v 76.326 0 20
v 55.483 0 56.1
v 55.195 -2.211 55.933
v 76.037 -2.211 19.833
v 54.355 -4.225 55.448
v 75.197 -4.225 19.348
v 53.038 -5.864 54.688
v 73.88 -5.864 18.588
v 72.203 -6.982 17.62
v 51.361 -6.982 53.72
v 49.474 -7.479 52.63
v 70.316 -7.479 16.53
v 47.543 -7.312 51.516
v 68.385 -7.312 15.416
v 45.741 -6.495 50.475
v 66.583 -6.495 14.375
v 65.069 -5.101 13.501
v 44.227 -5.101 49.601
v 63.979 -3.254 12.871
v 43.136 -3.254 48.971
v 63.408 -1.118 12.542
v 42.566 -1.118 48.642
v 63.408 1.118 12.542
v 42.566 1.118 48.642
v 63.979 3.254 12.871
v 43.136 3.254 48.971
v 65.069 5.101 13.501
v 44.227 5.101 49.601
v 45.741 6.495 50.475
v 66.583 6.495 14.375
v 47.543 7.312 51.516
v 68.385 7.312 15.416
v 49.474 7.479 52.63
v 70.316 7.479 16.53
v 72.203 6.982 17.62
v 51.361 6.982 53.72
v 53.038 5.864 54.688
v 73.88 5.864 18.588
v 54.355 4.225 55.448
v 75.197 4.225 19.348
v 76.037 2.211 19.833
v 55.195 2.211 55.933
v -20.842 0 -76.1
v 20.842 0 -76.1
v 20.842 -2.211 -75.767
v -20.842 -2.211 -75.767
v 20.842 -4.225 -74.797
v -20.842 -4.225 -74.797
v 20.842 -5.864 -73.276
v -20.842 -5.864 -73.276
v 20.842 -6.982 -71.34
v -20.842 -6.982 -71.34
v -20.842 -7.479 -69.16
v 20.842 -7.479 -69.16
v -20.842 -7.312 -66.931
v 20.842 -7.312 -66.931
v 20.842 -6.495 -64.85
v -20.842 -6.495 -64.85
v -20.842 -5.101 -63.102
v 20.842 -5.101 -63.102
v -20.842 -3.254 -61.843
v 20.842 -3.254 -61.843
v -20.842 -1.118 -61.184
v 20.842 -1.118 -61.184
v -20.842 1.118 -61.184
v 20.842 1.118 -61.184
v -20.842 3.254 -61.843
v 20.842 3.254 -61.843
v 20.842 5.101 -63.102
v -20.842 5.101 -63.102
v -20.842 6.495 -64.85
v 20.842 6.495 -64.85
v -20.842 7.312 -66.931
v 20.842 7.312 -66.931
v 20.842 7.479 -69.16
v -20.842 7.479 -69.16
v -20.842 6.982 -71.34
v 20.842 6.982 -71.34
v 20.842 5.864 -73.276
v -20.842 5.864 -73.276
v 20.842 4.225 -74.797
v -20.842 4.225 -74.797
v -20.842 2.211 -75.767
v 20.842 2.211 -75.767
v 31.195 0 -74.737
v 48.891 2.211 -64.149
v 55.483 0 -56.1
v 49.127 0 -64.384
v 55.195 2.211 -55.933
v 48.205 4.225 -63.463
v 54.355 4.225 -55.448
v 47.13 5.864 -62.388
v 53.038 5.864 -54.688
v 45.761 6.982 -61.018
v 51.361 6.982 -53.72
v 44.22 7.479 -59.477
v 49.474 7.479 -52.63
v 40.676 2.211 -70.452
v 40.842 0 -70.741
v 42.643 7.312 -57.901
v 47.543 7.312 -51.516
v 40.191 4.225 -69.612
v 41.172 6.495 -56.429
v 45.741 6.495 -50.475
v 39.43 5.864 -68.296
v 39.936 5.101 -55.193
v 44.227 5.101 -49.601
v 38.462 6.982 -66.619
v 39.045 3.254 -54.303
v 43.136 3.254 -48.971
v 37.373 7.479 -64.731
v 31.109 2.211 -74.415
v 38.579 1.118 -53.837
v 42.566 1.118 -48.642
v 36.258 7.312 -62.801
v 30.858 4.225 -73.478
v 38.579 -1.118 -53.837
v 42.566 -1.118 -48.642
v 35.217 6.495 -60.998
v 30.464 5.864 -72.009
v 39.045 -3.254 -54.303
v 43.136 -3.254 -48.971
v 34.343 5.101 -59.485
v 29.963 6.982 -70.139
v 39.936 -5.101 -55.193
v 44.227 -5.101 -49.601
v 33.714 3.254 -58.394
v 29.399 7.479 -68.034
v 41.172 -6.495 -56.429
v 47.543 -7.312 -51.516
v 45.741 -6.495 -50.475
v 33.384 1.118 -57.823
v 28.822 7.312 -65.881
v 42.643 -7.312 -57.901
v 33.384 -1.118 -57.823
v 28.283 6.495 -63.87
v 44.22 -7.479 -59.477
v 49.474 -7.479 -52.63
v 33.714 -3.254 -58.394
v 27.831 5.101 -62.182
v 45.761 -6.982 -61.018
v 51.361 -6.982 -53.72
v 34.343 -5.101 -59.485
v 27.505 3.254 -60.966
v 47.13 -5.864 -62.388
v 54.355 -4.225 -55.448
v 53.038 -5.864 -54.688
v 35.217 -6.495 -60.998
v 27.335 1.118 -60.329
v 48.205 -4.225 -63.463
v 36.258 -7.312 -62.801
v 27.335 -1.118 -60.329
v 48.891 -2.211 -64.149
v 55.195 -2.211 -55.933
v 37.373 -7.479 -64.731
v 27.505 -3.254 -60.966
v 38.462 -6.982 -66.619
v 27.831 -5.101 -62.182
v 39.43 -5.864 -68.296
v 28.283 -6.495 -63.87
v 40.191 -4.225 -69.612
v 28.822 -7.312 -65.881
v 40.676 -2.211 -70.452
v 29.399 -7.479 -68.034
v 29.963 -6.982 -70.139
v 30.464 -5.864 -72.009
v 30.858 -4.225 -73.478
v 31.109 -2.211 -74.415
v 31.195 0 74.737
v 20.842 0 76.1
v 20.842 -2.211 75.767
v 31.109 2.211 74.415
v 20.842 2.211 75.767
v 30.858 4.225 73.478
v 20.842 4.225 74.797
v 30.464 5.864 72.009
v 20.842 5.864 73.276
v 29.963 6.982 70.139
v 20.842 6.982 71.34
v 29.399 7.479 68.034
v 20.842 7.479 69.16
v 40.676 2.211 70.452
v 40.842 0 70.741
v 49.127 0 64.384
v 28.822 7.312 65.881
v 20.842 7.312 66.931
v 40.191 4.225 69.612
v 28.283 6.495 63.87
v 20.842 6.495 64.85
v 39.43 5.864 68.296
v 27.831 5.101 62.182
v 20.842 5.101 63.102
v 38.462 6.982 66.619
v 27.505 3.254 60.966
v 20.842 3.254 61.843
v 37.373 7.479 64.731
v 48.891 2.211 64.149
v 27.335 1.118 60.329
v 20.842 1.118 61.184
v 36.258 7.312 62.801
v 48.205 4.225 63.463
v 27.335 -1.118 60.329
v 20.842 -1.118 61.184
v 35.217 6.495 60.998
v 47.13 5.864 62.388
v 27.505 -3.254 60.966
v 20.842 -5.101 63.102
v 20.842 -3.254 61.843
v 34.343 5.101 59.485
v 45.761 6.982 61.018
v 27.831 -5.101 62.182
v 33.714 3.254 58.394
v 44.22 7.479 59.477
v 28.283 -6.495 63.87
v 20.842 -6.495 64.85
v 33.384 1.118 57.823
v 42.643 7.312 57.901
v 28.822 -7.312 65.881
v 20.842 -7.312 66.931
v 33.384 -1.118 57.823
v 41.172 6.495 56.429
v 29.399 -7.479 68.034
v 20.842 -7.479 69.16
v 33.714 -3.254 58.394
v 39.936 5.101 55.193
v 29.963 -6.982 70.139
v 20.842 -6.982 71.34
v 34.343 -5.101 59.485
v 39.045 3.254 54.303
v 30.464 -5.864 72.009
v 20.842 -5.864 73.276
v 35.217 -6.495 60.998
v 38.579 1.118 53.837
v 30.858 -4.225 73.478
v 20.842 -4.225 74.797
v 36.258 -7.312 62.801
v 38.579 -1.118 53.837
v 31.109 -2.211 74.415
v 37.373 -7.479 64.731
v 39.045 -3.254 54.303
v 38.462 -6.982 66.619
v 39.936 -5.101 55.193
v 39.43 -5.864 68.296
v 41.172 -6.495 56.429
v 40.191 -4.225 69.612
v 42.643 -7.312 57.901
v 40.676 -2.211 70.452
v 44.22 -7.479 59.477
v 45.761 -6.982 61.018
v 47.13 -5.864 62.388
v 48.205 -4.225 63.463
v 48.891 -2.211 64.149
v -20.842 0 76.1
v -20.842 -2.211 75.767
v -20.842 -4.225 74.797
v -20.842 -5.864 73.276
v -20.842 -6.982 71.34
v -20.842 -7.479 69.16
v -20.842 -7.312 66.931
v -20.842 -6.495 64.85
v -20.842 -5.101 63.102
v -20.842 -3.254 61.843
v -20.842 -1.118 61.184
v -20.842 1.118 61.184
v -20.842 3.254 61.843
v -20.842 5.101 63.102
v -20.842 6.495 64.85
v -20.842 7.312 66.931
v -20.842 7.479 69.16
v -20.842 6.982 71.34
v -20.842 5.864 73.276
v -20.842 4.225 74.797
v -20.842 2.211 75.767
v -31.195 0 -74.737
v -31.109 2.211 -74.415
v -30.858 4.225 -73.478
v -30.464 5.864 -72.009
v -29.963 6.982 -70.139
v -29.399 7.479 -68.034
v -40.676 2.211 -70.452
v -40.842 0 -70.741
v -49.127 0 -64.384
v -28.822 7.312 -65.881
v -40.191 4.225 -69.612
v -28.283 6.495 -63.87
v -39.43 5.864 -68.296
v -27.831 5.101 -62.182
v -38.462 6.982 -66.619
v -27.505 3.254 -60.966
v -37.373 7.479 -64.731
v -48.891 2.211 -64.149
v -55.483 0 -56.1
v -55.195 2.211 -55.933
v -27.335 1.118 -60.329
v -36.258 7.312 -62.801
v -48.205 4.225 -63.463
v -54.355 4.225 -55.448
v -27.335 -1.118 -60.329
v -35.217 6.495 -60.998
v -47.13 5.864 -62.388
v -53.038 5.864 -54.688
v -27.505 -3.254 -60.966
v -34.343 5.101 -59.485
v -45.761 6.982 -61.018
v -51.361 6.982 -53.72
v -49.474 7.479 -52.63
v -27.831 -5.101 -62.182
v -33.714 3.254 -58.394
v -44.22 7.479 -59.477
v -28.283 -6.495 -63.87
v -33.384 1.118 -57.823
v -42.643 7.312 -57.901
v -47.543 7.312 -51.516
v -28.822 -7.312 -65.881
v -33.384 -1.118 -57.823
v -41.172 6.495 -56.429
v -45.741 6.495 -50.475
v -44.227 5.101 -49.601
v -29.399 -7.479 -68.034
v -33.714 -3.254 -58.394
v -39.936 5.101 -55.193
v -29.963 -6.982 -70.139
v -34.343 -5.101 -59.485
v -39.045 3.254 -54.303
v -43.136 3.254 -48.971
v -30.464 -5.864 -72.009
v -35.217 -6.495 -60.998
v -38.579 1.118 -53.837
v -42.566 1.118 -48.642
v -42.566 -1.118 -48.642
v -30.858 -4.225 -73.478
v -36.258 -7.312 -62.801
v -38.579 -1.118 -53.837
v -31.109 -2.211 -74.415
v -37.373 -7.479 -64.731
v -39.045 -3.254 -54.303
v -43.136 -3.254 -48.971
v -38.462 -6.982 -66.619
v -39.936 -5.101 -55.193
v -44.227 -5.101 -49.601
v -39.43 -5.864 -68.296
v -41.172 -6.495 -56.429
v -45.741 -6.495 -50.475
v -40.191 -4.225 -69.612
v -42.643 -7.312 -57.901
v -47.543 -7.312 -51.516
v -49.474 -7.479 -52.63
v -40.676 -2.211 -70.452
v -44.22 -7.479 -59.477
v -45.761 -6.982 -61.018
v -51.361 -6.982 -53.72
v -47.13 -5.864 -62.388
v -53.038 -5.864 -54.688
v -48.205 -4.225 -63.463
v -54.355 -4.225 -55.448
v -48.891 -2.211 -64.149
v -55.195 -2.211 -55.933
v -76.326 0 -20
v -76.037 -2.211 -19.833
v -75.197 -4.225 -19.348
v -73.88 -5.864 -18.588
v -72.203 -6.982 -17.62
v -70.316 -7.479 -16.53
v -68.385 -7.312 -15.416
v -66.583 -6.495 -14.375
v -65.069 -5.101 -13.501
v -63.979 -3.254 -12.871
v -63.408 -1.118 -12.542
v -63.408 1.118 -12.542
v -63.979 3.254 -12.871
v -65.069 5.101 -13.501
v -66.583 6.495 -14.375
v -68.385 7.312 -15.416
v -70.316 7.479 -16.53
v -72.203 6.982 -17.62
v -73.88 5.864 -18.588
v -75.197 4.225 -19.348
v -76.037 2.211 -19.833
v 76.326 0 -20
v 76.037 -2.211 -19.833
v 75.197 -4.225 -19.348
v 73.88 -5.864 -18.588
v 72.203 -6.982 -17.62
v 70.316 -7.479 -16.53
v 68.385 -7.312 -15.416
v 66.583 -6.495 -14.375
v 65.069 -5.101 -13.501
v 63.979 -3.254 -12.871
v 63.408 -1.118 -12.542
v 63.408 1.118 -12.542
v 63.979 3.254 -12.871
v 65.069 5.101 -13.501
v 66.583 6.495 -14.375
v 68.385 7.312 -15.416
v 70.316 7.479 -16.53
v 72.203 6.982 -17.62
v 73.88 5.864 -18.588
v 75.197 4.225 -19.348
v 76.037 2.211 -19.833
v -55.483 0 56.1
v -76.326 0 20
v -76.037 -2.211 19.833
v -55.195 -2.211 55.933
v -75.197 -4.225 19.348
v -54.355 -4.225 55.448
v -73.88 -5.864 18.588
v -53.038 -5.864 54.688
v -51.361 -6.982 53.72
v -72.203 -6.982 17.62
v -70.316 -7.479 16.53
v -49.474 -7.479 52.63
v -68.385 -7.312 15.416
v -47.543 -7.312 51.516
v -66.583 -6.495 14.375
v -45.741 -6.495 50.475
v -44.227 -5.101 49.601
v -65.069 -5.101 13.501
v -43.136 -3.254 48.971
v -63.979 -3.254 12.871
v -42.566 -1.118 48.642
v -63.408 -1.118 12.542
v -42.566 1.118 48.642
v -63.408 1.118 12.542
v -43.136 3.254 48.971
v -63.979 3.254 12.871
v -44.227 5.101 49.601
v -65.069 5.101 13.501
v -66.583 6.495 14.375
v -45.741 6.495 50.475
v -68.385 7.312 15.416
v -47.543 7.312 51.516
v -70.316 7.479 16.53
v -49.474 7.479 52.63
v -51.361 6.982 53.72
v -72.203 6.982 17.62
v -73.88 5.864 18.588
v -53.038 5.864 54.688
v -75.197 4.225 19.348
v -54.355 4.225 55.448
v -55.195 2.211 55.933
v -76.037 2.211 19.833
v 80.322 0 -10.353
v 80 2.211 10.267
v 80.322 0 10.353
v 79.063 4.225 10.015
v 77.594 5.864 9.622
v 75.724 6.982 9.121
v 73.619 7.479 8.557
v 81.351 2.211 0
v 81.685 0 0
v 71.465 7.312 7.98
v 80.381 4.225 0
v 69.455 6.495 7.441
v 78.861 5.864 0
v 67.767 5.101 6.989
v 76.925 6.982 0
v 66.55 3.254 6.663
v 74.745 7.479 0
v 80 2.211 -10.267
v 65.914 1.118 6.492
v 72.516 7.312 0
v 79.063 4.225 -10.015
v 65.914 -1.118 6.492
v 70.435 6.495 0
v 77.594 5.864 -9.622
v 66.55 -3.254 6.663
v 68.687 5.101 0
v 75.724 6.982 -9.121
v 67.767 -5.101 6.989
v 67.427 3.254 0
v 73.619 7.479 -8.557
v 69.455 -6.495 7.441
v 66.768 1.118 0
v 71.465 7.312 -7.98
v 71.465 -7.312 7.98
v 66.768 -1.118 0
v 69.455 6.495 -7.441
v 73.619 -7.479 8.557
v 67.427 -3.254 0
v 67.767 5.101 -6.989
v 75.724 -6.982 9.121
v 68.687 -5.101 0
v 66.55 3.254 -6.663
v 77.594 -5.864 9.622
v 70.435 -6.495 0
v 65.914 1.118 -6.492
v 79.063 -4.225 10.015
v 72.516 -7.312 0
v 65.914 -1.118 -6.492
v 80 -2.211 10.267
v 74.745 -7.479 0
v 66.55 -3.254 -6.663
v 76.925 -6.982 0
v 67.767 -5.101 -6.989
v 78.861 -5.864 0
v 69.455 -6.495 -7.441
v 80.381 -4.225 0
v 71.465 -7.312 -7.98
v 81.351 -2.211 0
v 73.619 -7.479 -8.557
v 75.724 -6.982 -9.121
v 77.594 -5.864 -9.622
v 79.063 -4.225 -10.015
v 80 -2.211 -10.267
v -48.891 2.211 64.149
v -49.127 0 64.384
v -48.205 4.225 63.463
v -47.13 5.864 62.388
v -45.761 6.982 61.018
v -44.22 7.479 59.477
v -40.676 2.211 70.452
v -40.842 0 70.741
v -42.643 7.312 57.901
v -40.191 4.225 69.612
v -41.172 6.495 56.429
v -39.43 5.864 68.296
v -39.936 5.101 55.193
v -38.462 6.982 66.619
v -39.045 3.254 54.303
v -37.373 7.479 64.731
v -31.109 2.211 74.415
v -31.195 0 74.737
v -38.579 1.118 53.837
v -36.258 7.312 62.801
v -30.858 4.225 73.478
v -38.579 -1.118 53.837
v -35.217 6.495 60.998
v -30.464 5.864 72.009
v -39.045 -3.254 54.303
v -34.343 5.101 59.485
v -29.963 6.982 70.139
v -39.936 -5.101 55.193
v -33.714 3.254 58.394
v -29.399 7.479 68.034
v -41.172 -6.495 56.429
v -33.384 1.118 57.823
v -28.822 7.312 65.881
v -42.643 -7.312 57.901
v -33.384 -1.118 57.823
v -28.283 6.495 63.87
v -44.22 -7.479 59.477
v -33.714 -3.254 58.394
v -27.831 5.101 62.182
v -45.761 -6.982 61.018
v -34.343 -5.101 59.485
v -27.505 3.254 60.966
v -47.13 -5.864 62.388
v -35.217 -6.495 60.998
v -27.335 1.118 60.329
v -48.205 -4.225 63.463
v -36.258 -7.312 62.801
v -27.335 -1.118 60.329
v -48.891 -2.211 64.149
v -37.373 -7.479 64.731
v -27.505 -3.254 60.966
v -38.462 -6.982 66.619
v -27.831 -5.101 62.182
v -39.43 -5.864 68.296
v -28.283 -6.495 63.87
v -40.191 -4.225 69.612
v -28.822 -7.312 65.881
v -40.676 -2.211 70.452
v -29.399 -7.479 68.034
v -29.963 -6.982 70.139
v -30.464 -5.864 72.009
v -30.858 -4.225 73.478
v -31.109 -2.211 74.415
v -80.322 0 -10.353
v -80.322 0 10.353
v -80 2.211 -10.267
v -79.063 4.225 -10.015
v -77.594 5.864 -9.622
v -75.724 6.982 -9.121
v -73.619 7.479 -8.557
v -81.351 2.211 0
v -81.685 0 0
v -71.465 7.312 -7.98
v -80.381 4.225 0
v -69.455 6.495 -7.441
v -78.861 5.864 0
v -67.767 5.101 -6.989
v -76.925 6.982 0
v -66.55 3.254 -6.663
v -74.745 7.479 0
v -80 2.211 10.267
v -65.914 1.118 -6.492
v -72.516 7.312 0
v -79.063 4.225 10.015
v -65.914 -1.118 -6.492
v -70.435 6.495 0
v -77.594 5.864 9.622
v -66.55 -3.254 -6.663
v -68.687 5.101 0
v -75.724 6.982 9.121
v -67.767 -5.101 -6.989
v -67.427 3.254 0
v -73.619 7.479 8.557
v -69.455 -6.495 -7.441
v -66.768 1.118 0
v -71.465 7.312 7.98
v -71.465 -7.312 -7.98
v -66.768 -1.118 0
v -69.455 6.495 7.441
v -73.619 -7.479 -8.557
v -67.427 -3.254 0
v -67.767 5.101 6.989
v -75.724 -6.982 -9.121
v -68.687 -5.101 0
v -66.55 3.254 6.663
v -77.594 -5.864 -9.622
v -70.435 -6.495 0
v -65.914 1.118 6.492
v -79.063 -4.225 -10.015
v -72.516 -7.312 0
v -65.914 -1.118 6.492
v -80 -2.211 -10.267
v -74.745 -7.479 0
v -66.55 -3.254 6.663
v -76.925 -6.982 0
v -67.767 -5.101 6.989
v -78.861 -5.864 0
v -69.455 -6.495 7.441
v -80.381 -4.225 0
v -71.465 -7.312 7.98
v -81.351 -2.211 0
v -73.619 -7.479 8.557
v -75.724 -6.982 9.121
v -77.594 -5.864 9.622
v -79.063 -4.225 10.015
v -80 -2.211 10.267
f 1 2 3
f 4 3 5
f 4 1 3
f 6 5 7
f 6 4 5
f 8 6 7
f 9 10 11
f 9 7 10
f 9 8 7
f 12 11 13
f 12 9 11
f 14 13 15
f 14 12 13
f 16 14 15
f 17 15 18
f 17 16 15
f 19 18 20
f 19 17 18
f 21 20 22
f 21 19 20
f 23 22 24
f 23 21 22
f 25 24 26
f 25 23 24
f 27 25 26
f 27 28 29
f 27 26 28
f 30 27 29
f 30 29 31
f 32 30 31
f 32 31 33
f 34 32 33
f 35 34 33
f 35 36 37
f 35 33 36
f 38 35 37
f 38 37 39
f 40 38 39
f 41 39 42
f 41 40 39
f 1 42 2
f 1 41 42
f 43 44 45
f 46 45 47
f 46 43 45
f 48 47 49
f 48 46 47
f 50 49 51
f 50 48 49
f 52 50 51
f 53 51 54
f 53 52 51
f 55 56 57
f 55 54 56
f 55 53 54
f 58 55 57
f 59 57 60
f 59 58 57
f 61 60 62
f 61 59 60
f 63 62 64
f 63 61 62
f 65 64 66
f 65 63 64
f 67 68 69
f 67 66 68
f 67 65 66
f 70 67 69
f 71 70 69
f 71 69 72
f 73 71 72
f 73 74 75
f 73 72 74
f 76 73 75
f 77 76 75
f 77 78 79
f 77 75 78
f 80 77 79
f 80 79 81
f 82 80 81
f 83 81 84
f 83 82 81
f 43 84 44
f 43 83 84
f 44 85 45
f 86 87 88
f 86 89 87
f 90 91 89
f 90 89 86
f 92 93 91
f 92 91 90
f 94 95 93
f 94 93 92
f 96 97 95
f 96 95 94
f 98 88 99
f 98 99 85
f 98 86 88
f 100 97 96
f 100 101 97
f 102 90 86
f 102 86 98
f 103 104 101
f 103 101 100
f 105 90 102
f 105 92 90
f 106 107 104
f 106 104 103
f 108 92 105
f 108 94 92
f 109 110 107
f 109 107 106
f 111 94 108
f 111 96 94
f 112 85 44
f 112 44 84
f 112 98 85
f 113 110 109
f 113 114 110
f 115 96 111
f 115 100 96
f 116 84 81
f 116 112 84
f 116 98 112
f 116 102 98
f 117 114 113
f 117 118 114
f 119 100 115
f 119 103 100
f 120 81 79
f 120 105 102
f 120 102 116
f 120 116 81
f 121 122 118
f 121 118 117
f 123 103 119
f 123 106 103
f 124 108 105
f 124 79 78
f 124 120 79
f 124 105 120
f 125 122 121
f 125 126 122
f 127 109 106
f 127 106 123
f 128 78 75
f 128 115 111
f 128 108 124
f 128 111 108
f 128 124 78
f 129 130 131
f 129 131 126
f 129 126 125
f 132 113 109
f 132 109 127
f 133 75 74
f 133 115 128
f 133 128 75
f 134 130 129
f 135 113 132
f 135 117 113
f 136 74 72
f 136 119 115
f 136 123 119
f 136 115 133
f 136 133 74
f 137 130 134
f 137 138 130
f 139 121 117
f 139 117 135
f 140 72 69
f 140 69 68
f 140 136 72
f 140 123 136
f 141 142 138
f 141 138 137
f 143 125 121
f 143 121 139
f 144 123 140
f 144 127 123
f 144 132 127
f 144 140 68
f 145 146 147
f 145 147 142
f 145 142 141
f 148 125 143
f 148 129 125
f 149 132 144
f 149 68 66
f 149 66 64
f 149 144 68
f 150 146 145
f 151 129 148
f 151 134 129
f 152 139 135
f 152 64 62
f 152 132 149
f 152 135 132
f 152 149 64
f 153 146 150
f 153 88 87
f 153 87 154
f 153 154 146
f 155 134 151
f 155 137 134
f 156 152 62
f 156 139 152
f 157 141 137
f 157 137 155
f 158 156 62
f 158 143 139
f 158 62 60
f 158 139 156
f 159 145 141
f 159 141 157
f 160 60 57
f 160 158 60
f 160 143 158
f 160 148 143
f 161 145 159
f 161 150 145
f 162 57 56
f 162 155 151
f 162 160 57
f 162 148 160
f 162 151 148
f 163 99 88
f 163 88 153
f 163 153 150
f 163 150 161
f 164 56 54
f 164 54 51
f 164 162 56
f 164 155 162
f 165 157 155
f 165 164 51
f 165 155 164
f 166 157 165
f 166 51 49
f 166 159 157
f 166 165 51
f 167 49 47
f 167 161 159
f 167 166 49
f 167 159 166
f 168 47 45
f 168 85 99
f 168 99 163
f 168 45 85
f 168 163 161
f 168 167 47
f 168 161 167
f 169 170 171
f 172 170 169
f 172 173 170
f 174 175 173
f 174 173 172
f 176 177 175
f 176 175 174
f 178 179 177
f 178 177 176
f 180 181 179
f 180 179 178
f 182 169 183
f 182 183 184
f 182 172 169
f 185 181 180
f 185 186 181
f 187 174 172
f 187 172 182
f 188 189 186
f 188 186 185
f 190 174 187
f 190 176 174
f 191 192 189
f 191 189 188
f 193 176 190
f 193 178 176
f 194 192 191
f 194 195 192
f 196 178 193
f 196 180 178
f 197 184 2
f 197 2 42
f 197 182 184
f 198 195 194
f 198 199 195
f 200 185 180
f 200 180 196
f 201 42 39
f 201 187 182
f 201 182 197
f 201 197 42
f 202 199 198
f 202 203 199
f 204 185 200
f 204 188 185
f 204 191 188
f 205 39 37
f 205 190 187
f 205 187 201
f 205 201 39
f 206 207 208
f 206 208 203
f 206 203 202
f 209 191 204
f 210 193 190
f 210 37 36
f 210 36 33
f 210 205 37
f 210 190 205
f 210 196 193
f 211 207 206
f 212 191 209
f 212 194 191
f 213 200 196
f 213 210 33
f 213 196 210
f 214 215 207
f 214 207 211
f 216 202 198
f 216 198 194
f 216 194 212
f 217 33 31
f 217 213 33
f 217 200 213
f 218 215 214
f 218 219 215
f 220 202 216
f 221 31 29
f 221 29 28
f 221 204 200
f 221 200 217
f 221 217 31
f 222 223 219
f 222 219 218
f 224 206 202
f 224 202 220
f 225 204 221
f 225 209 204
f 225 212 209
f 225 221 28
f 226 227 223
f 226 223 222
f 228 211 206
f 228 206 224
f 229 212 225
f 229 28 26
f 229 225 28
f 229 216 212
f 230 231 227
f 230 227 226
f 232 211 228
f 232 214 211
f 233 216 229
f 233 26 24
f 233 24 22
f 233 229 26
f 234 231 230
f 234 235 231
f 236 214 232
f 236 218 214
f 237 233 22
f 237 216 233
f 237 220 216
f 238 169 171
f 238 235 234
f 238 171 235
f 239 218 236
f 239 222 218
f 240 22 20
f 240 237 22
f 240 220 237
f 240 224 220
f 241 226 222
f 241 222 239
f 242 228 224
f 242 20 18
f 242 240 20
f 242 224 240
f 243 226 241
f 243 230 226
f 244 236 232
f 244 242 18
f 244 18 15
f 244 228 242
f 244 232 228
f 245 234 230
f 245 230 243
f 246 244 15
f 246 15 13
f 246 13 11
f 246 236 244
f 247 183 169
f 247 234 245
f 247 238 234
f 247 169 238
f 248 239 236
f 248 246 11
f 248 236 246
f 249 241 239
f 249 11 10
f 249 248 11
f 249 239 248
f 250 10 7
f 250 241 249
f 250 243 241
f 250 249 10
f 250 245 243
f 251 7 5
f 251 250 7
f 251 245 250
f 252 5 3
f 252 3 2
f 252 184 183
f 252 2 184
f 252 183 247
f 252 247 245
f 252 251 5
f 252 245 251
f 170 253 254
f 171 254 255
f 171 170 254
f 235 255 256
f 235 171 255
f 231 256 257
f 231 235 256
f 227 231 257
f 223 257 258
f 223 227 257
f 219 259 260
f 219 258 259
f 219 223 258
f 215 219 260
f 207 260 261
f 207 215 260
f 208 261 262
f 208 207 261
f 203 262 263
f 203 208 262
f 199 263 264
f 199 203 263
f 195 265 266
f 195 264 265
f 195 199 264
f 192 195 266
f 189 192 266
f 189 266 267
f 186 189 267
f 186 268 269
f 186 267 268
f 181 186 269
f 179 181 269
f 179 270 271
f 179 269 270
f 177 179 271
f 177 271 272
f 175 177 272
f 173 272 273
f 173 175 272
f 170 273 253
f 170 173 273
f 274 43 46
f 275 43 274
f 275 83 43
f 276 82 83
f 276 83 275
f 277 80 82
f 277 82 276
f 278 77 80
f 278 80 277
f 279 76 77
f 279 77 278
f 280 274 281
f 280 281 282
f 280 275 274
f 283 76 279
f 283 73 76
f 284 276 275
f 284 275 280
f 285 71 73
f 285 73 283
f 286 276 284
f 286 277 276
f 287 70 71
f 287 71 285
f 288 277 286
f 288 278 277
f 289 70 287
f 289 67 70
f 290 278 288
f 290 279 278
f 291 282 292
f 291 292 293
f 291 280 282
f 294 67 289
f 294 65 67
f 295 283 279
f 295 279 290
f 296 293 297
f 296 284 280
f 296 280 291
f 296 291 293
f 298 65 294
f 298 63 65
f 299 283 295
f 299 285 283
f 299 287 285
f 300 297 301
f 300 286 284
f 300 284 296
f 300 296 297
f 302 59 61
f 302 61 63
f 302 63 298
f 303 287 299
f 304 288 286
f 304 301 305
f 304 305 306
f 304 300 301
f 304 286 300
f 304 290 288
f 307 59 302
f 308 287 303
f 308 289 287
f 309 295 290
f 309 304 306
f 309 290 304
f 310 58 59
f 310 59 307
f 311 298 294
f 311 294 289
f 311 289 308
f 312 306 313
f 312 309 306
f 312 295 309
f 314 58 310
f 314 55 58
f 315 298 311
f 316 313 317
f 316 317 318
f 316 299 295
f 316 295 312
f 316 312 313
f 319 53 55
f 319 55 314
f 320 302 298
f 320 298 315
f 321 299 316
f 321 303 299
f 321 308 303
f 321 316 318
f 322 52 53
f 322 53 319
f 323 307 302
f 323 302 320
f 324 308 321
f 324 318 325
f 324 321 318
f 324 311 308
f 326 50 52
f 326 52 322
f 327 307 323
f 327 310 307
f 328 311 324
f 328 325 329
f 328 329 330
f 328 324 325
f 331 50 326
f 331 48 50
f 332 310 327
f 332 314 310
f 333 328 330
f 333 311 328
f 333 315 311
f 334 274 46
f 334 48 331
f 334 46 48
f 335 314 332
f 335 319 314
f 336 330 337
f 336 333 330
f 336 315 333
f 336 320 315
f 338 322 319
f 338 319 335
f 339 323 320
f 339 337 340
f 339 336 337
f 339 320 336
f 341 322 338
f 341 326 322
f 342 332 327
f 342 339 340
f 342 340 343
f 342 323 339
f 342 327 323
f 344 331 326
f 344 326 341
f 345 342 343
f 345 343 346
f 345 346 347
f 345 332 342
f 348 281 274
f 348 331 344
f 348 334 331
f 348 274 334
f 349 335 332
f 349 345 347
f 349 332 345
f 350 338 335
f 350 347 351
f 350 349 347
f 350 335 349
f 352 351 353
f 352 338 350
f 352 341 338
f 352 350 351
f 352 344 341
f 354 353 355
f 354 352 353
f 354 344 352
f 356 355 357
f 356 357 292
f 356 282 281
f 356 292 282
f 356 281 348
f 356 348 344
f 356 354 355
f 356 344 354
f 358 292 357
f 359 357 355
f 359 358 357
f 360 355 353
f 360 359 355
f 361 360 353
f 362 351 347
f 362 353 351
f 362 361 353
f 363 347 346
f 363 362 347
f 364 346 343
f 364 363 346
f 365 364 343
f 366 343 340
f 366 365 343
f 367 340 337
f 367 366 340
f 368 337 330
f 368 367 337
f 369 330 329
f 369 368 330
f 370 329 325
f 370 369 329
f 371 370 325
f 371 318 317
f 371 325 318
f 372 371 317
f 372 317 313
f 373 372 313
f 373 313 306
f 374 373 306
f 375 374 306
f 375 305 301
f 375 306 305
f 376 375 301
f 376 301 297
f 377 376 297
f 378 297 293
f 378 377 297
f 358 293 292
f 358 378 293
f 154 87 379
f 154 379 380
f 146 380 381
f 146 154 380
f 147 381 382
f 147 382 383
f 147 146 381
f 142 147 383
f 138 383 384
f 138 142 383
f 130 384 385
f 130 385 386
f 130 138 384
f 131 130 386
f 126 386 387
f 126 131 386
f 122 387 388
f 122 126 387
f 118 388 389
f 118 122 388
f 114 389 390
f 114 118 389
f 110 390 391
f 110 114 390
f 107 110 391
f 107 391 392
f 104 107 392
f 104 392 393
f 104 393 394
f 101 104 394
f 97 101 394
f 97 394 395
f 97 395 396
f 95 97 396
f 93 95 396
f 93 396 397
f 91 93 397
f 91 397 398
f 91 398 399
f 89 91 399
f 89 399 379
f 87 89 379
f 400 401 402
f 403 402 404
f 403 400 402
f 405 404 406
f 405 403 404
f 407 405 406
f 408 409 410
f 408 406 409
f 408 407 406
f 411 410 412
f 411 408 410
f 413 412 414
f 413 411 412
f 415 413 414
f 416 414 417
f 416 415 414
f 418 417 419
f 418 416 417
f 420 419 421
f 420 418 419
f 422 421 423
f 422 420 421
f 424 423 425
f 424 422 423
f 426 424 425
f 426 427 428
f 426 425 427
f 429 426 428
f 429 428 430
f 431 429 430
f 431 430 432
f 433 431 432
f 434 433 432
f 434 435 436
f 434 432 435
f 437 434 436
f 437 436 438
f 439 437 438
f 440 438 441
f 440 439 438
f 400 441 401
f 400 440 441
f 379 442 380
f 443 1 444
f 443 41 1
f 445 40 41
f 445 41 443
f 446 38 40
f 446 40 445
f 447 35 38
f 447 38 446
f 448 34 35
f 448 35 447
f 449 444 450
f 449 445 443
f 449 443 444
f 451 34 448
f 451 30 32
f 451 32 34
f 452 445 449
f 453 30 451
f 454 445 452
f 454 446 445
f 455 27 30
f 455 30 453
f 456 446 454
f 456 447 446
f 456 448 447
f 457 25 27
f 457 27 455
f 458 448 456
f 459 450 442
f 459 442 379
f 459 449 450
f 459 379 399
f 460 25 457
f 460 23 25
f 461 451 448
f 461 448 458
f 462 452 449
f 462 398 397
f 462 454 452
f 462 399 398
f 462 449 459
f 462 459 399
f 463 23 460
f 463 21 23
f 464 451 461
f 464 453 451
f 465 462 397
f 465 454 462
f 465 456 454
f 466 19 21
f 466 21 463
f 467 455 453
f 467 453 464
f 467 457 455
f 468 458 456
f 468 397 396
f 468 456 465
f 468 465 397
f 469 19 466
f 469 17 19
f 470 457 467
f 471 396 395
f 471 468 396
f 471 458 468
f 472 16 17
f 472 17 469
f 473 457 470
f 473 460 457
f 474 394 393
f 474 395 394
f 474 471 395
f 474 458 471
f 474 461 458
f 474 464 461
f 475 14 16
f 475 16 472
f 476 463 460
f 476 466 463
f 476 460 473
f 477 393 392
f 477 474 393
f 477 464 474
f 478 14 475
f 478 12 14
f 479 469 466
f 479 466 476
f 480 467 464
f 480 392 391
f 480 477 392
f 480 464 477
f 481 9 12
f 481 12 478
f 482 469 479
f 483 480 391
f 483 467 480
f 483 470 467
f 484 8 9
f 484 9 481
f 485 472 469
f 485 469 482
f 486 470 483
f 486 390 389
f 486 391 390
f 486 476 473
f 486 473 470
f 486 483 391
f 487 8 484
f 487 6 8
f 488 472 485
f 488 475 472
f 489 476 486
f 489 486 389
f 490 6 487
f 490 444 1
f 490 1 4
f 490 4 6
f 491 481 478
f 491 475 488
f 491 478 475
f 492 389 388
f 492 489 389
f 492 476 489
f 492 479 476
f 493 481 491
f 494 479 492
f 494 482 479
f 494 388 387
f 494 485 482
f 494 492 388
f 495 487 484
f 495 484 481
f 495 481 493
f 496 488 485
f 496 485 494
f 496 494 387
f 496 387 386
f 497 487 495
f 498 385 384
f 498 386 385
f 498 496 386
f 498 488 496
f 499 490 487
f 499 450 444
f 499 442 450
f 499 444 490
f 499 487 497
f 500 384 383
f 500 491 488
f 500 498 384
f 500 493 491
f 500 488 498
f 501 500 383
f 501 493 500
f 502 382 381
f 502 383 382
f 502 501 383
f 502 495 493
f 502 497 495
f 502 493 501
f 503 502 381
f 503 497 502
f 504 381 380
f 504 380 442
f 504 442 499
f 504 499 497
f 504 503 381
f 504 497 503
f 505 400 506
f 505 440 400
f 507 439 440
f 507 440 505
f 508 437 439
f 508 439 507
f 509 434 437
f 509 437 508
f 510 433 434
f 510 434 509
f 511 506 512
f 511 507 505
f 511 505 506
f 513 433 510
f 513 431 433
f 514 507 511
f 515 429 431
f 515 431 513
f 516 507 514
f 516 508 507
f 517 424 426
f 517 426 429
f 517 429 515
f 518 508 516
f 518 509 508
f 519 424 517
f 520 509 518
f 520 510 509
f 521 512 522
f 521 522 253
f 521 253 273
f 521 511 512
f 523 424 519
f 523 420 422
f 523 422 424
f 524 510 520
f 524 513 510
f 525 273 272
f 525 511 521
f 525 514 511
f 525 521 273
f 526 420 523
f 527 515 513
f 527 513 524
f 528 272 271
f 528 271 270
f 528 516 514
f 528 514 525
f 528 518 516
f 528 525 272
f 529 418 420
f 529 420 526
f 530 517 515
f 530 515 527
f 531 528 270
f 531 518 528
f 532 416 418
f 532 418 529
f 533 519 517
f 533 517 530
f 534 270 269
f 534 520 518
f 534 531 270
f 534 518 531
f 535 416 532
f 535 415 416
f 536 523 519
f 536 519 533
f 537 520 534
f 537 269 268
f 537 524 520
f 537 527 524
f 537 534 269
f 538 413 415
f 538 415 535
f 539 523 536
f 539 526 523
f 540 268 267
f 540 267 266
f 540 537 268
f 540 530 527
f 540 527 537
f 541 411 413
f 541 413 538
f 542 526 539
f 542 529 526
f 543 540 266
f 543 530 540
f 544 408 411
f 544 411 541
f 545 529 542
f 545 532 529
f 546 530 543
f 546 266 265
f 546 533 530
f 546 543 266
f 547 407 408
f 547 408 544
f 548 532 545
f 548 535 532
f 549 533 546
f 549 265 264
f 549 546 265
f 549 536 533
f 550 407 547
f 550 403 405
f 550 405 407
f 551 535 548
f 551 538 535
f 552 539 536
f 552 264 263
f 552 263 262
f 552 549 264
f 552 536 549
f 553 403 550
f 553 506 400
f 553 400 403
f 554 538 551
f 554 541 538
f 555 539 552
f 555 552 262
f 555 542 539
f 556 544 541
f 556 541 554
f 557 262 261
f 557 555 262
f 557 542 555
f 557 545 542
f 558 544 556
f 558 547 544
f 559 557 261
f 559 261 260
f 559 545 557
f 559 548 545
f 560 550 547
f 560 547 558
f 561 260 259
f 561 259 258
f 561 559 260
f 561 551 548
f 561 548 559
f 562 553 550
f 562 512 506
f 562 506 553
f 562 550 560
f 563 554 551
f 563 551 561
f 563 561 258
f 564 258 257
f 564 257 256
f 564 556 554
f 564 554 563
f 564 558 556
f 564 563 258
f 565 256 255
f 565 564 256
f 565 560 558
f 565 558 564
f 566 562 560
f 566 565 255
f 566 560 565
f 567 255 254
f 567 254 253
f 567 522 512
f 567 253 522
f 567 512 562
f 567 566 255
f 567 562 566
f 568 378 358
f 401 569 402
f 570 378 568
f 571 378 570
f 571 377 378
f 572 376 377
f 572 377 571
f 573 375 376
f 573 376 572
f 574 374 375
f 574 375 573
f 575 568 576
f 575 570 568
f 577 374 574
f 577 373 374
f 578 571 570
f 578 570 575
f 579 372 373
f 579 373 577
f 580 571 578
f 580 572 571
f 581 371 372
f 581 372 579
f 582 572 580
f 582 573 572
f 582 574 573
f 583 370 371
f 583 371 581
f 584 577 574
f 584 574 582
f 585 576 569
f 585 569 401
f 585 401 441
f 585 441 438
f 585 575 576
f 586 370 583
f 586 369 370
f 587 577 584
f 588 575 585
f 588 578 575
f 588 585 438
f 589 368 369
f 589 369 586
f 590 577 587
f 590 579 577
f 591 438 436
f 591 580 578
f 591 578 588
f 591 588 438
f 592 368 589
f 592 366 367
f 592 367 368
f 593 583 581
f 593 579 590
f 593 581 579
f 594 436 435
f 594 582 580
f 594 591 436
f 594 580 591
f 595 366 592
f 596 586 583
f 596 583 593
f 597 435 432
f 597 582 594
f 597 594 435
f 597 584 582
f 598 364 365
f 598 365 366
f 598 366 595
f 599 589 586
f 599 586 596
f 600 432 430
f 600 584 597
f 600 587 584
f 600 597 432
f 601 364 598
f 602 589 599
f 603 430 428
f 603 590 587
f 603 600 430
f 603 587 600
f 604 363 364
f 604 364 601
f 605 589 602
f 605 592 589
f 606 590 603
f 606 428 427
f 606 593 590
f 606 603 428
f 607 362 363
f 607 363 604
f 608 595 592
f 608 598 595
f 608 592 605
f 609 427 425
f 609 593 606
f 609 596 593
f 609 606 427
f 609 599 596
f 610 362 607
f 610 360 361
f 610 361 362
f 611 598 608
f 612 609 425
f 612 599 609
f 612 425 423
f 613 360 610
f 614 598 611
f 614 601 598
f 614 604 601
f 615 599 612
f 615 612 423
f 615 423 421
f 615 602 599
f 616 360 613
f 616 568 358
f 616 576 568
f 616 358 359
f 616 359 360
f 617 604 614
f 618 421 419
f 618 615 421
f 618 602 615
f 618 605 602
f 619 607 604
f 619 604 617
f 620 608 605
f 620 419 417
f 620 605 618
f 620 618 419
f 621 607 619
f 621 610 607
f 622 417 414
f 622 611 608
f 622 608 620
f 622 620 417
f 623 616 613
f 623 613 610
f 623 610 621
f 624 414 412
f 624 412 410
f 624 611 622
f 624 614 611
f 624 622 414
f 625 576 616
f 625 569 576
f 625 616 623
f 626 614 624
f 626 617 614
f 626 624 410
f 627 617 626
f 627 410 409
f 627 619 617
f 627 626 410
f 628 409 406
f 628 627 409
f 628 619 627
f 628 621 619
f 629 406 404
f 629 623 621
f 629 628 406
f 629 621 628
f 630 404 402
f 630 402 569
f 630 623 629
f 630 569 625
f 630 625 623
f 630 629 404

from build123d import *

# Parameters (mm, degrees)
SKETCH2_R = 7.5


with BuildPart() as part:
    # Sweep1: sweep along a path in Sketch1
    with BuildLine(Plane(origin=(0, 0, 0), x_dir=(1, 0, 0), z_dir=(0, 1, 0))) as sweep1_path:
        Line((63.33532453, 12.5), (42.492979812, 48.6))
        ThreePointArc((42.492979812, 48.6), (33.342344718, 57.750635095), (20.842344718, 61.1))
        Line((20.842344718, 61.1), (-20.842344718, 61.1))
        ThreePointArc((-20.842344718, 61.1), (-33.342344718, 57.750635095), (-42.492979812, 48.6))
        Line((-42.492979812, 48.6), (-63.33532453, 12.5))
        ThreePointArc((-63.33532453, 12.5), (-66.684689435, 0), (-63.33532453, -12.5))
        Line((-63.33532453, -12.5), (-42.492979812, -48.6))
        ThreePointArc((-42.492979812, -48.6), (-33.342344718, -57.750635095), (-20.842344718, -61.1))
        Line((-20.842344718, -61.1), (20.842344718, -61.1))
        ThreePointArc((20.842344718, -61.1), (33.342344718, -57.750635095), (42.492979812, -48.6))
        Line((42.492979812, -48.6), (63.33532453, -12.5))
        ThreePointArc((63.33532453, -12.5), (66.684689435, 0), (63.33532453, 12.5))
    # Sketch2 → Sweep1 (sweep)
    with BuildSketch(Plane(origin=(0, 0, 0), x_dir=(0, 0, -1), z_dir=(1, 0, 0))):
        with Locations((68.6, 0)):
            Circle(SKETCH2_R)
    sweep(path=sweep1_path.line)


solid = part.part
